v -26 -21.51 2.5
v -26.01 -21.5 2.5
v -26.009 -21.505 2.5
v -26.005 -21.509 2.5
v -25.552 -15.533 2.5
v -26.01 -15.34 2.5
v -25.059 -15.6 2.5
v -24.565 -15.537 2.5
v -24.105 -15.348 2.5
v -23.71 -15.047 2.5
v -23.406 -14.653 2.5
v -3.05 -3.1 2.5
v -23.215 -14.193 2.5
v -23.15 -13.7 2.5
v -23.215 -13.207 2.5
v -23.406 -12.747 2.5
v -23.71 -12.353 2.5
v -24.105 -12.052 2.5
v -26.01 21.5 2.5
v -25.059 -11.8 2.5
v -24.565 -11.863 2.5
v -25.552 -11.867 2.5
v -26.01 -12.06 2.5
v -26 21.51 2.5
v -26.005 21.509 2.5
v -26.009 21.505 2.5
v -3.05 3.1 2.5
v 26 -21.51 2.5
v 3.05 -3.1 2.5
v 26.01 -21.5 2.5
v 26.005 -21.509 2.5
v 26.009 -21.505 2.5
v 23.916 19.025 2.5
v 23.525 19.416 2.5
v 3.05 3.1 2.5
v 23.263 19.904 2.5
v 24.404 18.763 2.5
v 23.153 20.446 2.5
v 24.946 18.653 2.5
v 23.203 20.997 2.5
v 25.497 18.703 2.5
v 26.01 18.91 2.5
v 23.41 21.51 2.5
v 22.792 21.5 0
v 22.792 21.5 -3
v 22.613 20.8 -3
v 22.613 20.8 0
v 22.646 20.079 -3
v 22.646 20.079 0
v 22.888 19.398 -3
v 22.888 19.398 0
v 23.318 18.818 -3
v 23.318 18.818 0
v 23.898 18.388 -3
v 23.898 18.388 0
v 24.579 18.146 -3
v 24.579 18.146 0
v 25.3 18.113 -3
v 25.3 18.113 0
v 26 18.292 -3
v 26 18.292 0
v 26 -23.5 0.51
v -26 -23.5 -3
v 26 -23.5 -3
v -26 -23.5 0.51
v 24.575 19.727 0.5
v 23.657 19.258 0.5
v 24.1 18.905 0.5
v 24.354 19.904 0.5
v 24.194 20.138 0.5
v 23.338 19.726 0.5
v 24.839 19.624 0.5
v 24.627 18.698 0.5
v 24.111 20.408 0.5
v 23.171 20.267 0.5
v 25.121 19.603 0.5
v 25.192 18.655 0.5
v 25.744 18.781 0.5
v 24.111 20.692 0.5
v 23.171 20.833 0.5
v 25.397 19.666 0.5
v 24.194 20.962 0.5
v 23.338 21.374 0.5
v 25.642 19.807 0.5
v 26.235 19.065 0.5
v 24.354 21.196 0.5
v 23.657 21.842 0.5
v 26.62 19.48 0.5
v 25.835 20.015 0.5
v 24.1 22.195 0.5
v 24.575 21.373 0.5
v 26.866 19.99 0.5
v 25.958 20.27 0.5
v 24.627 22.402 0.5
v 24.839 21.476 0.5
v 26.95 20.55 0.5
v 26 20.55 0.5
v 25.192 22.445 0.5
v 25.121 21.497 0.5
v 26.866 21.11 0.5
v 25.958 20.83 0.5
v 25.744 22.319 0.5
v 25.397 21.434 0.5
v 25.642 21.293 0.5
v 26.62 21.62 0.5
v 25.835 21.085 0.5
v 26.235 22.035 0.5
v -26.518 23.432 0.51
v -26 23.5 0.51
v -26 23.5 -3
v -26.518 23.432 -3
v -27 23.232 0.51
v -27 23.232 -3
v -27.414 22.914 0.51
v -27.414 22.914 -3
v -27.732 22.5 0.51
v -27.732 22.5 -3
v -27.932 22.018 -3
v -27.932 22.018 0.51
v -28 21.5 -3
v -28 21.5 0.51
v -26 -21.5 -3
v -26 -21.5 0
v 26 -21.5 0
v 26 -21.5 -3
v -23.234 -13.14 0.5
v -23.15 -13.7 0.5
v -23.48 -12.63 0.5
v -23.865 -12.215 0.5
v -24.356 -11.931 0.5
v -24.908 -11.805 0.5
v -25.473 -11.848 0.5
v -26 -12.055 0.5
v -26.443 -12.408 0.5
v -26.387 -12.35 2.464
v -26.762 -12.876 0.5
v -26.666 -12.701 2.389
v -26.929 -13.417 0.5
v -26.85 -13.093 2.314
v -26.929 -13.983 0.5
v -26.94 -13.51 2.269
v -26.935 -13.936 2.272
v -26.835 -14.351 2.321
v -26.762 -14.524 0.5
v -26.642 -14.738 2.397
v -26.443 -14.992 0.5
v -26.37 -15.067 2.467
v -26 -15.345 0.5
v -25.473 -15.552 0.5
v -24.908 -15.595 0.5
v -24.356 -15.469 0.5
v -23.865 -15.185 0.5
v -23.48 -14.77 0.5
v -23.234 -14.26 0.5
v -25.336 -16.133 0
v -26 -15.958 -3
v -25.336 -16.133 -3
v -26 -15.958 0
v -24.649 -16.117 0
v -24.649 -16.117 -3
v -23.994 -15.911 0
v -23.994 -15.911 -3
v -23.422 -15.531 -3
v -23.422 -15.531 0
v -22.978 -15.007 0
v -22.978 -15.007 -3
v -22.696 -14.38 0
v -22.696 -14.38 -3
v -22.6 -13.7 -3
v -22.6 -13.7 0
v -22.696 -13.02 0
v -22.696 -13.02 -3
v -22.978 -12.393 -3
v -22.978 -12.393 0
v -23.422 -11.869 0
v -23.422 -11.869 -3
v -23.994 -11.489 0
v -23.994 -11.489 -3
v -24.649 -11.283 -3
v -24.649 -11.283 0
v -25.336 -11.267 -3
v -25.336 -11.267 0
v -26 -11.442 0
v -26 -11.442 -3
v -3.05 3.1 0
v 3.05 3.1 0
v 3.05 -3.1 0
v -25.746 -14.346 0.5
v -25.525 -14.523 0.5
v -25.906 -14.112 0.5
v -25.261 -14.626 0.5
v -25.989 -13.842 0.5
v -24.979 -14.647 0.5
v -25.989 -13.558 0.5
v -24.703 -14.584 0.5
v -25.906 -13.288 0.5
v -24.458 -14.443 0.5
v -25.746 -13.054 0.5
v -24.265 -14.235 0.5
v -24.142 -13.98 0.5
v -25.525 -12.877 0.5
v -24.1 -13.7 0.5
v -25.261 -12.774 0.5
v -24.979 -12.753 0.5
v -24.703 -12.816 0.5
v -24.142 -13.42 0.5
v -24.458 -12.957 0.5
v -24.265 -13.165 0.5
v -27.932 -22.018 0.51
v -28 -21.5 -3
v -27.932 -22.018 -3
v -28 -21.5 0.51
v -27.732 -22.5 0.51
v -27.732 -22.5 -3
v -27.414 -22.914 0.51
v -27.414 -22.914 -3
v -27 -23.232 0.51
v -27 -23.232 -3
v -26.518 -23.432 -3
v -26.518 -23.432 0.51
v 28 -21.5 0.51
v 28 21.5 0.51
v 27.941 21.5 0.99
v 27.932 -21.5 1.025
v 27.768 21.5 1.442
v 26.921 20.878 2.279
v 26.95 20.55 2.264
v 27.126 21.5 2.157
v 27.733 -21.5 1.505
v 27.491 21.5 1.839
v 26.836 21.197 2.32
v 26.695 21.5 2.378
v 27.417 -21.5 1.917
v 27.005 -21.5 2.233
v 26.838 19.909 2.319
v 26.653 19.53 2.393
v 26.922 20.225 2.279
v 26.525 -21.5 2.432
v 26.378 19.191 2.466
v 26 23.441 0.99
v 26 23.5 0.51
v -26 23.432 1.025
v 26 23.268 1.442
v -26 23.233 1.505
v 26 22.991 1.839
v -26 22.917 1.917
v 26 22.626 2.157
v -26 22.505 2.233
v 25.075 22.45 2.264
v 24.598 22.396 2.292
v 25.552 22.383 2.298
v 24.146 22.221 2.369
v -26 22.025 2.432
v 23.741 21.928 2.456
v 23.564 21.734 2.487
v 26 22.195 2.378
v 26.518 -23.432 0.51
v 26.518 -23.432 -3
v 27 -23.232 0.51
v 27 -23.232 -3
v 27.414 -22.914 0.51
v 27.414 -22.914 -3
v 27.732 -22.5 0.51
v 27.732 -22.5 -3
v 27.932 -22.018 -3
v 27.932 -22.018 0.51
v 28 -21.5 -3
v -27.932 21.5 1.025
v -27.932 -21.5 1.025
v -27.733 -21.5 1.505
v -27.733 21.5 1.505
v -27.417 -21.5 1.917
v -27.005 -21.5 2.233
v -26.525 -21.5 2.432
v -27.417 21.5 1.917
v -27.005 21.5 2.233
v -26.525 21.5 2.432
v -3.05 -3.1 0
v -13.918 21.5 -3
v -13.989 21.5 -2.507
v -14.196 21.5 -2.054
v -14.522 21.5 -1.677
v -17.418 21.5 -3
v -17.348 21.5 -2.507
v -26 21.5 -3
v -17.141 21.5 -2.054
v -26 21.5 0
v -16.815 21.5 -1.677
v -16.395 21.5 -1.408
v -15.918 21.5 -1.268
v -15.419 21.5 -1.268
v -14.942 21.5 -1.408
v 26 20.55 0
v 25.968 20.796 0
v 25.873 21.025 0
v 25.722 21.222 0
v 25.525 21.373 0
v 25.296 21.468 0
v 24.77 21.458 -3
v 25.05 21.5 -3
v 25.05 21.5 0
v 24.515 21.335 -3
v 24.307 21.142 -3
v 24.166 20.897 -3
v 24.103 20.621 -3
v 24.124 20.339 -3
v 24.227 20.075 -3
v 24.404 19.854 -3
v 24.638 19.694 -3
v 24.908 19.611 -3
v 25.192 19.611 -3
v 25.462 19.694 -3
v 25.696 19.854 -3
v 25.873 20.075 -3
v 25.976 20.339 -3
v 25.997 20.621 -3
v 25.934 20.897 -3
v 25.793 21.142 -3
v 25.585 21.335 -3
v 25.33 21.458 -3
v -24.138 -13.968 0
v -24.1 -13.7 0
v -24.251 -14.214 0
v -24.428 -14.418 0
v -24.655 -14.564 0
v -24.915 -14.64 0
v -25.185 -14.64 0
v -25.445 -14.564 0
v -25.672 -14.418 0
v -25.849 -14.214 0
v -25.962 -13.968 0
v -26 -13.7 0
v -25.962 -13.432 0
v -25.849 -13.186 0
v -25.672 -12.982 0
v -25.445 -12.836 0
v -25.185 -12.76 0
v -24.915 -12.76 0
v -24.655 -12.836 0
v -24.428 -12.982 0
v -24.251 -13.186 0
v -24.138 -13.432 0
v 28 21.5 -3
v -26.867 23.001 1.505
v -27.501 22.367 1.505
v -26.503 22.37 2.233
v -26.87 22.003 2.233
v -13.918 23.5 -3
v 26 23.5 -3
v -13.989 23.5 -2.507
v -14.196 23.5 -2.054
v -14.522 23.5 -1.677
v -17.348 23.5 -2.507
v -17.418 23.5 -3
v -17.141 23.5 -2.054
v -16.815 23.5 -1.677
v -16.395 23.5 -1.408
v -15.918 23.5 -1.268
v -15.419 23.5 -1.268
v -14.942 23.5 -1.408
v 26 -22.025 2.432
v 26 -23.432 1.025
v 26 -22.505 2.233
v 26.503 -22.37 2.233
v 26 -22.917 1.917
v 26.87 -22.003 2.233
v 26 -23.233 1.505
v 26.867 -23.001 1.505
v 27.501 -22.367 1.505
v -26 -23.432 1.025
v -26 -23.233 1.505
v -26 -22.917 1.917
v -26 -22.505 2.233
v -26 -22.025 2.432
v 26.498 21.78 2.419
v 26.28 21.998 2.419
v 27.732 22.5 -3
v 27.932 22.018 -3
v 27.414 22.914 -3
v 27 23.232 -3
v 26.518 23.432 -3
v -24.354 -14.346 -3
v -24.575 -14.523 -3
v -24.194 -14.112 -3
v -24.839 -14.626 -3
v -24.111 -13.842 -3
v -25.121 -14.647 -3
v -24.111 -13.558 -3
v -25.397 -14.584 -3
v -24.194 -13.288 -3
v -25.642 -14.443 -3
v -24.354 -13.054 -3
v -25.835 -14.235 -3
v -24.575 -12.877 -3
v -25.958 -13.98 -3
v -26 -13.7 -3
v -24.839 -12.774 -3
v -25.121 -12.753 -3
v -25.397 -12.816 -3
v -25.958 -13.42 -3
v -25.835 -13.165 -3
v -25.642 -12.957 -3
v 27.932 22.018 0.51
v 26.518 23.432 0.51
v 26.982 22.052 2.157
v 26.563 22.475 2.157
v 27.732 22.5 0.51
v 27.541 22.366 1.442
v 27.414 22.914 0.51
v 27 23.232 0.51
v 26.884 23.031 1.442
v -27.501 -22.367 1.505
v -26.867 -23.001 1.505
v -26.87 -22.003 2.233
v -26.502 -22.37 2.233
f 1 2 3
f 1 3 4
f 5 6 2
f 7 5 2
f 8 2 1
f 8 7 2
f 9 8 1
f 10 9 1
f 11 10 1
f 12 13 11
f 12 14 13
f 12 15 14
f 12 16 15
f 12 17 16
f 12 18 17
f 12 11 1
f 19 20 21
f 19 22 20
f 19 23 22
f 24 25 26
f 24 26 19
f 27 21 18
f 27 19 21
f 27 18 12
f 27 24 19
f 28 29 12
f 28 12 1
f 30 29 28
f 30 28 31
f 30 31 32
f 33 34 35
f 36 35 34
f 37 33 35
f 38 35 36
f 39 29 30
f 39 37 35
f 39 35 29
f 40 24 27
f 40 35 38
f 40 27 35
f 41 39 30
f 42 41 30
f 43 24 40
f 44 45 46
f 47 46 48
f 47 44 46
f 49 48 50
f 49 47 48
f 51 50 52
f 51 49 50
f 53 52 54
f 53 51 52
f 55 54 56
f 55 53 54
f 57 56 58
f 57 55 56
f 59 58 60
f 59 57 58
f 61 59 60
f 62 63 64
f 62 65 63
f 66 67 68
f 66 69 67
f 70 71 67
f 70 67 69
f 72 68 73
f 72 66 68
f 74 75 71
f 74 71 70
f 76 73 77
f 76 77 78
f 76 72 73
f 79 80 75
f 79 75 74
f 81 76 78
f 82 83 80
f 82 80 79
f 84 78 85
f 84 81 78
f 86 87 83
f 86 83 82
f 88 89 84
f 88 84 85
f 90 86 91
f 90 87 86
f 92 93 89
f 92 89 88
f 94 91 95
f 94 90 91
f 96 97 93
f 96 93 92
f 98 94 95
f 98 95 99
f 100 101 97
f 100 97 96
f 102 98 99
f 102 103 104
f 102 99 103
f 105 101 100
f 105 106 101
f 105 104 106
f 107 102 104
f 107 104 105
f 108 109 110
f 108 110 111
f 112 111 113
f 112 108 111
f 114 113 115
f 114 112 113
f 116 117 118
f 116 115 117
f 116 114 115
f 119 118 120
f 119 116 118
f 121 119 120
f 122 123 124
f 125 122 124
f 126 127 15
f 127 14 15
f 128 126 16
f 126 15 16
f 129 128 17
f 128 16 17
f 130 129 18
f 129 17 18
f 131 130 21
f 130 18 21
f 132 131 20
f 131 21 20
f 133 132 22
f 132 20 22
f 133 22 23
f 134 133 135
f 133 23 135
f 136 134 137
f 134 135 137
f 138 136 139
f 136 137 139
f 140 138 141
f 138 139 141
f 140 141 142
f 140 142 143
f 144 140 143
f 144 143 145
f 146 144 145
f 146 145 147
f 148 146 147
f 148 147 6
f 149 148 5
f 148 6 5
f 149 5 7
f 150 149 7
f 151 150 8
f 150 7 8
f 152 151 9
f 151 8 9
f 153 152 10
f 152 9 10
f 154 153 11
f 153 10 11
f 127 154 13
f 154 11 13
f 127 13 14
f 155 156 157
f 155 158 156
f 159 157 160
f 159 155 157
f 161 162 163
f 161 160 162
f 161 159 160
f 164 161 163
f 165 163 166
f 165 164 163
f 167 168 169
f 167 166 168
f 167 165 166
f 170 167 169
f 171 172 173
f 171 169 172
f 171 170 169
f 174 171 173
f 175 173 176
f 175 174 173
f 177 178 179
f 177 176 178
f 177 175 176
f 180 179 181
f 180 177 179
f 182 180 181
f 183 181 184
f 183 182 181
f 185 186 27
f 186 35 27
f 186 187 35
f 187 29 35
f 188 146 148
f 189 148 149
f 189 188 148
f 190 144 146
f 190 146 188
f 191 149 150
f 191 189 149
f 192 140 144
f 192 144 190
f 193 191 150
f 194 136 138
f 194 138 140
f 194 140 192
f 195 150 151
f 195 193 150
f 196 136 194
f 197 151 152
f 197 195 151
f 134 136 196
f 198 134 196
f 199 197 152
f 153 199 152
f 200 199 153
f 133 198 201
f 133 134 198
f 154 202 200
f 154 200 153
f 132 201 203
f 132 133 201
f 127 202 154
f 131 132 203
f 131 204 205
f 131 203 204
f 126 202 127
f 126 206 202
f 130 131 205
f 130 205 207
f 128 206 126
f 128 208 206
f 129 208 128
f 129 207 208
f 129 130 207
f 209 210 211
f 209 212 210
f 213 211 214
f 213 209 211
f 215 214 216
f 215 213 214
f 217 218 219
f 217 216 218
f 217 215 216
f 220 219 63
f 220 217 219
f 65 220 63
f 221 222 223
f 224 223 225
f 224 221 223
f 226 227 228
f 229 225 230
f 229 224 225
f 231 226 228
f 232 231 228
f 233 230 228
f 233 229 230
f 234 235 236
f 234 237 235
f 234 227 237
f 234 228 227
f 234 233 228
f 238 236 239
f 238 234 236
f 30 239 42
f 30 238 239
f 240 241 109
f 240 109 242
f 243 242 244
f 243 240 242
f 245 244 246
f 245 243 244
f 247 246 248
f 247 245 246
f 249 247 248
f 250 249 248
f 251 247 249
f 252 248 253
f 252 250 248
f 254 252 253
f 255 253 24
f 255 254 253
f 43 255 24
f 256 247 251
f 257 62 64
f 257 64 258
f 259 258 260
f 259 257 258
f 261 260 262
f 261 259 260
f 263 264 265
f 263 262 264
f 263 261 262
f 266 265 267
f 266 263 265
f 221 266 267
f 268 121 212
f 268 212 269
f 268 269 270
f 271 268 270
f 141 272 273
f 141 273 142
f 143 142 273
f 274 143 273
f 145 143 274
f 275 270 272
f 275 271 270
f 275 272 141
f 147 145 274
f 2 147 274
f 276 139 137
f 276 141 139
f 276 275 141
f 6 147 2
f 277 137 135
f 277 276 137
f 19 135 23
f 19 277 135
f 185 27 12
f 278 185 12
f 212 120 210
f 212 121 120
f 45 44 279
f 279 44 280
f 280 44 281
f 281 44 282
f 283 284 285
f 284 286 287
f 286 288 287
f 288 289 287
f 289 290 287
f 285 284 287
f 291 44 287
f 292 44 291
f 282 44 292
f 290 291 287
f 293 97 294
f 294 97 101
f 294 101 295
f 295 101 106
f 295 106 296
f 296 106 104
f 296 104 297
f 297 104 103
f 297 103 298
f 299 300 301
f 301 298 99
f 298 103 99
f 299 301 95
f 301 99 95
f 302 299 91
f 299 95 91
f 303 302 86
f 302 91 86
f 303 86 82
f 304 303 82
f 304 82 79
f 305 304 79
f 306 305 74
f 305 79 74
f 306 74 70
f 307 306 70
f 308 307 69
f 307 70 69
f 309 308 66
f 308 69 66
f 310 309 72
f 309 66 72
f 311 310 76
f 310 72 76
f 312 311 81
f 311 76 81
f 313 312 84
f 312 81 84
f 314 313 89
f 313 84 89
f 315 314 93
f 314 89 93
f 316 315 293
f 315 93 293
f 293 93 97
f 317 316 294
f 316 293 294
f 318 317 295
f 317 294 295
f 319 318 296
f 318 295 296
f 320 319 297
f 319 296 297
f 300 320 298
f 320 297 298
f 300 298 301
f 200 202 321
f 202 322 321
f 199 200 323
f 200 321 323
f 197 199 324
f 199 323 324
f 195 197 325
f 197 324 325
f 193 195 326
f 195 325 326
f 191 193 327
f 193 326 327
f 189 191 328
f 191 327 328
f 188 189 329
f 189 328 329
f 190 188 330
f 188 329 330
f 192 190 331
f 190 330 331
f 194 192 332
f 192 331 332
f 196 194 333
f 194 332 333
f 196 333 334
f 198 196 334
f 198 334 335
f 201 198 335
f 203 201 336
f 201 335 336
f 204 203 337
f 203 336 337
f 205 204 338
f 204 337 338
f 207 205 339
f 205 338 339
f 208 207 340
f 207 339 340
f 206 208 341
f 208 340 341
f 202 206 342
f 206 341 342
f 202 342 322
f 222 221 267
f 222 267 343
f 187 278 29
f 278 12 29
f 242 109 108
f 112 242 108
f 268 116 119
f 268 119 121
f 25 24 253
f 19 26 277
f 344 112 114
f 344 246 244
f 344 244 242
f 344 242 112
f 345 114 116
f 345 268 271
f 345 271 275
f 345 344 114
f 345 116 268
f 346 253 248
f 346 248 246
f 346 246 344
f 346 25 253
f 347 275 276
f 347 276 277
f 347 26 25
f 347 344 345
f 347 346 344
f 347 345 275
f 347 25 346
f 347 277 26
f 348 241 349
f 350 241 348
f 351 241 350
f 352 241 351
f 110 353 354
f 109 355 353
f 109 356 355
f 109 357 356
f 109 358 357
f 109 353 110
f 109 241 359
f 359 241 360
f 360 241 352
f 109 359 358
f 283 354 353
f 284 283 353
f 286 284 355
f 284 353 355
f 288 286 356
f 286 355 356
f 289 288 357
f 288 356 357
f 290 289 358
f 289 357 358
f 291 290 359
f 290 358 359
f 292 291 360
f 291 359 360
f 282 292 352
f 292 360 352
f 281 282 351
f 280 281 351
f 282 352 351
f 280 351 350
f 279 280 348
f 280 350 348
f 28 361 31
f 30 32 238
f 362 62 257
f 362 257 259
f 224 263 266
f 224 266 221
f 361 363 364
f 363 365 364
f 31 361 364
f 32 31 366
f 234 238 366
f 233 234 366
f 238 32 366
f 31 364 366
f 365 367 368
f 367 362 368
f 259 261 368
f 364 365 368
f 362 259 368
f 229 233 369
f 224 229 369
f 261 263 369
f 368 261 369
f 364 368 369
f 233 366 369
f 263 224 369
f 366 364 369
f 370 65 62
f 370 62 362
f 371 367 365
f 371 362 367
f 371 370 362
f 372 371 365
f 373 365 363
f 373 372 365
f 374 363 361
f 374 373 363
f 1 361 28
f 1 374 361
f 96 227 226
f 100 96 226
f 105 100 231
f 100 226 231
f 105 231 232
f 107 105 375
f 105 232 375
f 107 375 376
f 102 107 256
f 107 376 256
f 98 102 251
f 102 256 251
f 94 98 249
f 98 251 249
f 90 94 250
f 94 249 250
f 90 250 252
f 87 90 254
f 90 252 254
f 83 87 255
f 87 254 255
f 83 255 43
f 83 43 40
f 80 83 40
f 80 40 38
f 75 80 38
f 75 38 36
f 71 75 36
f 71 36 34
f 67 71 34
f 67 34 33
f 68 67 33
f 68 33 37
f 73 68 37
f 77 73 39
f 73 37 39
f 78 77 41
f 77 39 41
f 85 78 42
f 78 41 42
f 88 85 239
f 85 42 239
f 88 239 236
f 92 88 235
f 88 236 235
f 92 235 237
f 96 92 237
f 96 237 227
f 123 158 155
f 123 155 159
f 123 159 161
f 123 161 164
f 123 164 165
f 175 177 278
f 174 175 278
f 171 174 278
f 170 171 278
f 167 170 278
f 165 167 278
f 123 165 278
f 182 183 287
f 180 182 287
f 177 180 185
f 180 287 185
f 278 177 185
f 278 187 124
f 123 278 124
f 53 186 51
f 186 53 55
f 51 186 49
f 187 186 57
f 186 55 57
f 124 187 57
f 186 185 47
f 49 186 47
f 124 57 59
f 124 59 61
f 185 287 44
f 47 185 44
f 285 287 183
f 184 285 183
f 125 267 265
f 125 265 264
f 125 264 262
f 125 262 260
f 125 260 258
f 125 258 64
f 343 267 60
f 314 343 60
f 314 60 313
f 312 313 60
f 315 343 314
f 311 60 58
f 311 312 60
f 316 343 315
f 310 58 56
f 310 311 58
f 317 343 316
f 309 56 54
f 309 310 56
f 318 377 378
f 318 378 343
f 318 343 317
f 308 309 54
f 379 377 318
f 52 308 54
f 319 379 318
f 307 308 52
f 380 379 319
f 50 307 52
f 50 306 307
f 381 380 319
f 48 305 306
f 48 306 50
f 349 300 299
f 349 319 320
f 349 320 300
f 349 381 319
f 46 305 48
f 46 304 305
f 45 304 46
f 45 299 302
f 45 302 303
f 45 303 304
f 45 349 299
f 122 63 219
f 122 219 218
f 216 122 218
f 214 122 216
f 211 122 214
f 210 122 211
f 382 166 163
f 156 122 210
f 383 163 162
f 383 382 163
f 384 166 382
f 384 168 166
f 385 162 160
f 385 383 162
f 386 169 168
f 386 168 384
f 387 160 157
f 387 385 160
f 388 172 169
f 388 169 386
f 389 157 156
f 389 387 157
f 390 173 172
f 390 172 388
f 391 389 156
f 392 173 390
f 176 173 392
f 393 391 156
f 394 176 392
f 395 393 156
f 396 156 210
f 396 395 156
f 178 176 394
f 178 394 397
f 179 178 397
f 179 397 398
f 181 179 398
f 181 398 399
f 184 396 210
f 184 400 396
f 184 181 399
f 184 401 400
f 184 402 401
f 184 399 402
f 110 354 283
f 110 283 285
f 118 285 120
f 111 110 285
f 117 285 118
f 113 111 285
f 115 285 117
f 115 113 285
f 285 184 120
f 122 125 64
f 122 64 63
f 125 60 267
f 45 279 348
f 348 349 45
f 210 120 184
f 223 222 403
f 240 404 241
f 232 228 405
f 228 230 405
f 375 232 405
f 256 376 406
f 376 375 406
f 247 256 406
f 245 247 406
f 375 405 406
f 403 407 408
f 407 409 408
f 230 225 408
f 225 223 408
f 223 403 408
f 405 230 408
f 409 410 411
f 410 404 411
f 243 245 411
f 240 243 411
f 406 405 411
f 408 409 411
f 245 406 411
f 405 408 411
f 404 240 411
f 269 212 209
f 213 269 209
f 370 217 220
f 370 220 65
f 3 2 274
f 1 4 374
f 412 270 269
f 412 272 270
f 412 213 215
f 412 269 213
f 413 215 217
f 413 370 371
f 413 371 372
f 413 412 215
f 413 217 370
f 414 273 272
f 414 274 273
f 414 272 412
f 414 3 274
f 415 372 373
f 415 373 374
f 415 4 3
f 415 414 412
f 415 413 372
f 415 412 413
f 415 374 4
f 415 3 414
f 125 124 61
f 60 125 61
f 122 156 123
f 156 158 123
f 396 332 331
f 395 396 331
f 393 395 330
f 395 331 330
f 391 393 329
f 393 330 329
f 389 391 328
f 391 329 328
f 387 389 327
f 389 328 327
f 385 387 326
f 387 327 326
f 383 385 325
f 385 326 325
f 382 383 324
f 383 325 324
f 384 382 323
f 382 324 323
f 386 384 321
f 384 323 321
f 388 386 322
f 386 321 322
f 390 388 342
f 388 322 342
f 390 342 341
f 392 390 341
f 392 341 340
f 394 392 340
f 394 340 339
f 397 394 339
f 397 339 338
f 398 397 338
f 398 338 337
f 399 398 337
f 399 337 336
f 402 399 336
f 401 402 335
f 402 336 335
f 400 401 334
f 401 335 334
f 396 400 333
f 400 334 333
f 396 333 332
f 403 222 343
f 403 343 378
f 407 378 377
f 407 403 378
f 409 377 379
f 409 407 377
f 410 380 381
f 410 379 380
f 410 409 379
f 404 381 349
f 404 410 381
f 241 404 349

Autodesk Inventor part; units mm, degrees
ref_plane "YZ Plane" through (0, 0, 0) normal (1, 0, 0) x (0, 1, 0)
ref_plane "XZ Plane" through (0, 0, 0) normal (0, 1, 0) x (-1, 0, 0)
ref_plane "Arbeitsebene1" through (26, 12.1004, 0) normal (0, 0, 1) x (1, 0, 0)
sketch "Skizze1" plane through (26, 12.1004, 0) normal (0, 0, 1) x (1, 0, 0)
  arc A0 (-54, -33.6004) -> (-52, -35.6004) centre (-52, -33.6004) ccw projected
  line L0 (-52, -35.6004) -> (0, -35.6004) projected
  arc A1 (0, -35.6004) -> (2, -33.6004) centre (0, -33.6004) ccw projected
  line L1 (2, -33.6004) -> (2, 9.3996) projected
  arc A2 (2, 9.3996) -> (0, 11.3996) centre (0, 9.3996) ccw projected
  line L2 (0, 11.3996) -> (-52, 11.3996) projected
  arc A3 (-52, 11.3996) -> (-54, 9.3996) centre (-52, 9.3996) ccw projected
  line L3 (-54, 9.3996) -> (-54, -33.6004) projected
  circle A4 centre (-0.95, 8.4496) radius 0.95 projected
  circle A5 centre (-51.05, -25.8004) radius 0.95 projected
  arc A6 (-24.2441, 3.8663) -> (-23.5, 4.8331) centre (-24.5, 4.8331) ccw projected
  line L4 (-23.5, 5.8996) -> (-23.5, 4.8331) projected
  line L5 (-24.5, 5.8996) -> (-23.5, 5.8996) projected
  line L6 (-24.5, 9.3996) -> (-24.5, 5.8996) projected
  line L7 (-24.5, 9.3996) -> (-7.5, 9.3996) projected
  line L8 (-7.5, 5.8996) -> (-7.5, 9.3996) projected
  line L9 (-8.5, 5.8996) -> (-7.5, 5.8996) projected
  line L10 (-8.5, 4.8996) -> (-8.5, 5.8996) projected
  arc A7 (-8.5, 4.8996) -> (-7.5, 3.8996) centre (-7.5, 4.8996) ccw projected
  line L11 (-7, 3.8996) -> (-7.5, 3.8996) projected
  arc A8 (-7, 3.8996) -> (-6, 4.8996) centre (-7, 4.8996) ccw projected
  line L12 (-6, 9.3996) -> (-6, 4.8996) projected
  line L13 (-6, 9.3996) -> (-4.3996, 9.3996) projected
  arc A9 (-3.3997, 8.4141) -> (-4.3996, 9.3996) centre (-4.3996, 8.3996) ccw projected
  arc A10 (-3.3997, 8.4141) -> (-0.9855, 5.9999) centre (-0.95, 8.4496) ccw projected
  arc A11 (0, 5) -> (-0.9855, 5.9999) centre (-1, 5) ccw projected
  line L14 (0, 5) -> (0, -25.7504) projected
  arc A12 (-0.5, -26.6164) -> (0, -25.7504) centre (-1, -25.7504) ccw projected
  arc A13 (-0.5, -26.6164) -> (-1, -27.4824) centre (0, -27.4824) ccw projected
  line L15 (-1, -28.7504) -> (-1, -27.4824) projected
  line L16 (0, -28.7504) -> (-1, -28.7504) projected
  line L17 (0, -28.7504) -> (0, -33.6004) projected
  line L18 (0, -33.6004) -> (-52, -33.6004) projected
  line L19 (-52, -33.6004) -> (-52, -28.7504) projected
  line L20 (-51, -28.7504) -> (-52, -28.7504) projected
  line L21 (-51, -28.6986) -> (-51, -28.7504) projected
  arc A14 (-50.5932, -28.2074) -> (-51, -28.6986) centre (-50.5, -28.6986) ccw projected
  arc A15 (-50.5932, -28.2074) -> (-51.0145, -23.3506) centre (-51.05, -25.8004) ccw projected
  arc A16 (-52, -22.3507) -> (-51.0145, -23.3506) centre (-51, -22.3507) ccw projected
  line L22 (-52, -22.3507) -> (-52, 2.2996) projected
  arc A17 (-51.5, 3.1657) -> (-52, 2.2996) centre (-51, 2.2996) ccw projected
  arc A18 (-51.5, 3.1657) -> (-51, 4.0317) centre (-52, 4.0317) ccw projected
  line L23 (-51, 5.2996) -> (-51, 4.0317) projected
  line L24 (-52, 5.2996) -> (-51, 5.2996) projected
  line L25 (-52, 5.2996) -> (-52, 9.3996) projected
  line L26 (-52, 9.3996) -> (-26, 9.3996) projected
  line L27 (-26, 5.2996) -> (-26, 9.3996) projected
  line L28 (-27, 5.2996) -> (-26, 5.2996) projected
  line L29 (-27, 4.2996) -> (-27, 5.2996) projected
  arc A19 (-27, 4.2996) -> (-26, 3.2996) centre (-26, 4.2996) ccw projected
  line L30 (-25.4165, 3.2996) -> (-26, 3.2996) projected
  arc A20 (-25.4165, 3.2996) -> (-24.7024, 3.5996) centre (-25.4165, 4.2996) ccw projected
  arc A21 (-24.2441, 3.8663) -> (-24.7024, 3.5996) centre (-23.9882, 2.8996) ccw projected
  point P0 (-26, -12.1004)
extrude "Extrusion1" add sketch "Skizze1" along normal blind 2.5 contours L3 A3 L2 A2 L1 A1 L0 A0 | A6 L4 L5 L6 L7 L8 L9 L10 A7 L11 A8 L12 L13 A9 A10 A11 L14 A12 A13 L15 L16 L17 L18 L19 L20 L21 A14 A15 A16 L22 A17 A18 L23 L24 L25 L26 L27 L28 L29 A19 L30 A20 A21
sketch "Skizze2" plane through (26, 12.1004, 2.5) normal (0, 0, 1) x (1, 0, 0)
  circle A0 centre (-0.95, 8.4496) radius 0.95 projected
  circle A1 centre (-51.05, -25.8004) radius 0.95 projected
  circle A2 centre (-51.05, -25.8004) radius 1.9
  circle A3 centre (-0.95, 8.4496) radius 1.9
  point P0 (-26, -12.1004)
  dimension "d2" = 3.8
  dimension "d3" = 3.8
extrude "Extrusion2" cut sketch "Skizze2" against normal blind 2
fillet "Rundung1" radius 1.99 8 edges at (27.4142, 22.9142, 2.5) (0, 23.5, 2.5) (-27.4142, 22.9142, 2.5) (-28, 0, 2.5) (-27.4142, -22.9142, 2.5) (0, -23.5, 2.5) (27.4142, -22.9142, 2.5) (28, 0, 2.5)
sketch "Skizze3" plane through (26, 12.1004, 2.5) normal (0, 0, 1) x (1, 0, 0)
  line L0 (-22.95, -9.0004) -> (-29.05, -9.0004)
  line L1 (-29.05, -9.0004) -> (-29.05, -15.2004)
  line L2 (-29.05, -15.2004) -> (-22.95, -15.2004)
  line L3 (-22.95, -15.2004) -> (-22.95, -9.0004)
  line L4 (-22.95, -9.0004) -> (-29.05, -15.2004) construction
  line L5 (-29.05, -9.0004) -> (-22.95, -15.2004) construction
  point P0 (-26, -12.1004)
  dimension "d7" = 6.1
  dimension "d8" = 6.2
extrude "Extrusion3" cut sketch "Skizze3" against normal through all
sketch "Skizze5" plane through (26, 12.1004, 0) normal (0, 0, -1) x (-1, 0, 0)
  line L0 (0, 9.3996) -> (52, 9.3996)
  line L1 (52, 9.3996) -> (52, -33.6004)
  line L2 (52, -33.6004) -> (0, -33.6004)
  line L3 (0, -33.6004) -> (0, 9.3996)
  line L4 (0, 11.3996) -> (52, 11.3996) projected
  line L5 (52, -35.6004) -> (0, -35.6004) projected
  line L6 (54, 9.3996) -> (54, -33.6004) projected
  line L7 (-2, -33.6004) -> (-2, 9.3996) projected
  line L8 (29.05, -15.2004) -> (22.95, -15.2004) projected
  line L9 (22.95, -15.2004) -> (22.95, -9.0004) projected
  line L10 (22.95, -9.0004) -> (29.05, -9.0004) projected
  line L11 (29.05, -9.0004) -> (29.05, -15.2004) projected
  line L12 (52, -35.6004) -> (0, -35.6004) projected
  arc A0 (52, -35.6004) -> (54, -33.6004) centre (52, -33.6004) ccw projected
  line L13 (54, 9.3996) -> (54, -33.6004) projected
  arc A1 (54, 9.3996) -> (52, 11.3996) centre (52, 9.3996) ccw projected
  line L14 (0, 11.3996) -> (52, 11.3996) projected
  arc A2 (0, 11.3996) -> (-2, 9.3996) centre (0, 9.3996) ccw projected
  line L15 (-2, -33.6004) -> (-2, 9.3996) projected
  arc A3 (-2, -33.6004) -> (0, -35.6004) centre (0, -33.6004) ccw projected
  circle A4 centre (0.95, 8.4496) radius 0.95 projected
  circle A5 centre (51.05, -25.8004) radius 0.95 projected
  point P0 (26, -12.1004)
  point P1 (54, -33.6004)
  point P2 (54, 9.3996)
  point P3 (52, 11.3996)
  point P4 (0, 11.3996)
  point P5 (-2, 9.3996)
  point P6 (-2, -33.6004)
  point P7 (0, -35.6004)
  dimension "d11" = 2
  dimension "d12" = 2
  dimension "d13" = 2
  dimension "d14" = 2
extrude "Extrusion4" add sketch "Skizze5" along normal blind 3 contours L4 A1 L6 A0 L5 A3 L7 A2
sketch "Skizze6" plane through (-26, 23.5, 0.51) normal (0, 1, 0) x (1, 0, 0)
  line L0 (52, 3.51) -> (0, 3.51) projected
  circle A0 centre (10.3315, 3.51) radius 1.75
  point P0 (26, 0.51)
  point P1 (8.5815, 3.51)
  point P2 (12.0815, 3.51)
  dimension "d17" = 3.5
extrude "Extrusion5" cut sketch "Skizze6" against normal blind 3 contours A0 L0 picked at (10.0001, 3.0299)
sketch "Skizze7" plane through (26, 12.1004, 0) normal (0, 0, -1) x (-1, 0, 0)
  line L0 (29.05, -15.2004) -> (22.95, -15.2004) projected
  line L1 (22.95, -15.2004) -> (22.95, -9.0004) projected
  line L2 (22.95, -9.0004) -> (29.05, -9.0004) projected
  line L3 (29.05, -9.0004) -> (29.05, -15.2004) projected
  line L4 (52, 9.3996) -> (0.95, 9.3996) projected
  arc A0 (0, 8.4496) -> (0.95, 9.3996) centre (0.95, 8.4496) ccw projected
  line L5 (0, 8.4496) -> (0, -33.6004) projected
  line L6 (0, -33.6004) -> (52, -33.6004) projected
  line L7 (52, -33.6004) -> (52, -25.8004) projected
  circle A1 centre (51.05, -25.8004) radius 0.95 projected
  line L8 (52, -25.8004) -> (52, 9.3996) projected
  circle A2 centre (51.05, -25.8004) radius 2.45
  circle A3 centre (0.95, 8.4496) radius 2.45
  line L9 (39.9185, 9.3996) -> (39.9185, 11.3996) projected
  line L10 (39.9185, 11.3996) -> (0, 11.3996) projected
  arc A4 (0, 11.3996) -> (-2, 9.3996) centre (0, 9.3996) ccw projected
  line L11 (-2, 9.3996) -> (-2, -33.6004) projected
  arc A5 (-2, -33.6004) -> (0, -35.6004) centre (0, -33.6004) ccw projected
  line L12 (0, -35.6004) -> (52, -35.6004) projected
  arc A6 (52, -35.6004) -> (54, -33.6004) centre (52, -33.6004) ccw projected
  line L13 (54, -33.6004) -> (54, 9.3996) projected
  arc A7 (54, 9.3996) -> (52, 11.3996) centre (52, 9.3996) ccw projected
  line L14 (52, 11.3996) -> (43.4185, 11.3996) projected
  line L15 (43.4185, 11.3996) -> (43.4185, 9.3996) projected
  line L16 (43.4185, 9.3996) -> (52, 9.3996) projected
  line L17 (52, 9.3996) -> (52, -33.6004) projected
  line L18 (52, -33.6004) -> (0, -33.6004) projected
  line L19 (0, -33.6004) -> (0, 9.3996) projected
  line L20 (0, 9.3996) -> (39.9185, 9.3996) projected
  arc A8 (0.95, 9.3996) -> (0, 8.4496) centre (0.95, 8.4496) ccw projected
  point P0 (26, -12.1004)
  point P1 (52, -23.542)
  point P2 (52, -28.0587)
  point P3 (0.95, 9.3996)
  point P4 (0.95, 9.3996)
  point P5 (0.95, 9.3996)
  point P6 (3.2083, 9.3996)
  point P7 (0, 6.1913)
  dimension "d20" = 1.5
  dimension "d21" = 1.5
extrude "Extrusion6" add sketch "Skizze7" along normal blind 3 contours L8 L7 A2 | A3 L5 A0 L4 | A8 L19 L20 picked at (49.1338, -25.5256)
properties part number "Lid"
